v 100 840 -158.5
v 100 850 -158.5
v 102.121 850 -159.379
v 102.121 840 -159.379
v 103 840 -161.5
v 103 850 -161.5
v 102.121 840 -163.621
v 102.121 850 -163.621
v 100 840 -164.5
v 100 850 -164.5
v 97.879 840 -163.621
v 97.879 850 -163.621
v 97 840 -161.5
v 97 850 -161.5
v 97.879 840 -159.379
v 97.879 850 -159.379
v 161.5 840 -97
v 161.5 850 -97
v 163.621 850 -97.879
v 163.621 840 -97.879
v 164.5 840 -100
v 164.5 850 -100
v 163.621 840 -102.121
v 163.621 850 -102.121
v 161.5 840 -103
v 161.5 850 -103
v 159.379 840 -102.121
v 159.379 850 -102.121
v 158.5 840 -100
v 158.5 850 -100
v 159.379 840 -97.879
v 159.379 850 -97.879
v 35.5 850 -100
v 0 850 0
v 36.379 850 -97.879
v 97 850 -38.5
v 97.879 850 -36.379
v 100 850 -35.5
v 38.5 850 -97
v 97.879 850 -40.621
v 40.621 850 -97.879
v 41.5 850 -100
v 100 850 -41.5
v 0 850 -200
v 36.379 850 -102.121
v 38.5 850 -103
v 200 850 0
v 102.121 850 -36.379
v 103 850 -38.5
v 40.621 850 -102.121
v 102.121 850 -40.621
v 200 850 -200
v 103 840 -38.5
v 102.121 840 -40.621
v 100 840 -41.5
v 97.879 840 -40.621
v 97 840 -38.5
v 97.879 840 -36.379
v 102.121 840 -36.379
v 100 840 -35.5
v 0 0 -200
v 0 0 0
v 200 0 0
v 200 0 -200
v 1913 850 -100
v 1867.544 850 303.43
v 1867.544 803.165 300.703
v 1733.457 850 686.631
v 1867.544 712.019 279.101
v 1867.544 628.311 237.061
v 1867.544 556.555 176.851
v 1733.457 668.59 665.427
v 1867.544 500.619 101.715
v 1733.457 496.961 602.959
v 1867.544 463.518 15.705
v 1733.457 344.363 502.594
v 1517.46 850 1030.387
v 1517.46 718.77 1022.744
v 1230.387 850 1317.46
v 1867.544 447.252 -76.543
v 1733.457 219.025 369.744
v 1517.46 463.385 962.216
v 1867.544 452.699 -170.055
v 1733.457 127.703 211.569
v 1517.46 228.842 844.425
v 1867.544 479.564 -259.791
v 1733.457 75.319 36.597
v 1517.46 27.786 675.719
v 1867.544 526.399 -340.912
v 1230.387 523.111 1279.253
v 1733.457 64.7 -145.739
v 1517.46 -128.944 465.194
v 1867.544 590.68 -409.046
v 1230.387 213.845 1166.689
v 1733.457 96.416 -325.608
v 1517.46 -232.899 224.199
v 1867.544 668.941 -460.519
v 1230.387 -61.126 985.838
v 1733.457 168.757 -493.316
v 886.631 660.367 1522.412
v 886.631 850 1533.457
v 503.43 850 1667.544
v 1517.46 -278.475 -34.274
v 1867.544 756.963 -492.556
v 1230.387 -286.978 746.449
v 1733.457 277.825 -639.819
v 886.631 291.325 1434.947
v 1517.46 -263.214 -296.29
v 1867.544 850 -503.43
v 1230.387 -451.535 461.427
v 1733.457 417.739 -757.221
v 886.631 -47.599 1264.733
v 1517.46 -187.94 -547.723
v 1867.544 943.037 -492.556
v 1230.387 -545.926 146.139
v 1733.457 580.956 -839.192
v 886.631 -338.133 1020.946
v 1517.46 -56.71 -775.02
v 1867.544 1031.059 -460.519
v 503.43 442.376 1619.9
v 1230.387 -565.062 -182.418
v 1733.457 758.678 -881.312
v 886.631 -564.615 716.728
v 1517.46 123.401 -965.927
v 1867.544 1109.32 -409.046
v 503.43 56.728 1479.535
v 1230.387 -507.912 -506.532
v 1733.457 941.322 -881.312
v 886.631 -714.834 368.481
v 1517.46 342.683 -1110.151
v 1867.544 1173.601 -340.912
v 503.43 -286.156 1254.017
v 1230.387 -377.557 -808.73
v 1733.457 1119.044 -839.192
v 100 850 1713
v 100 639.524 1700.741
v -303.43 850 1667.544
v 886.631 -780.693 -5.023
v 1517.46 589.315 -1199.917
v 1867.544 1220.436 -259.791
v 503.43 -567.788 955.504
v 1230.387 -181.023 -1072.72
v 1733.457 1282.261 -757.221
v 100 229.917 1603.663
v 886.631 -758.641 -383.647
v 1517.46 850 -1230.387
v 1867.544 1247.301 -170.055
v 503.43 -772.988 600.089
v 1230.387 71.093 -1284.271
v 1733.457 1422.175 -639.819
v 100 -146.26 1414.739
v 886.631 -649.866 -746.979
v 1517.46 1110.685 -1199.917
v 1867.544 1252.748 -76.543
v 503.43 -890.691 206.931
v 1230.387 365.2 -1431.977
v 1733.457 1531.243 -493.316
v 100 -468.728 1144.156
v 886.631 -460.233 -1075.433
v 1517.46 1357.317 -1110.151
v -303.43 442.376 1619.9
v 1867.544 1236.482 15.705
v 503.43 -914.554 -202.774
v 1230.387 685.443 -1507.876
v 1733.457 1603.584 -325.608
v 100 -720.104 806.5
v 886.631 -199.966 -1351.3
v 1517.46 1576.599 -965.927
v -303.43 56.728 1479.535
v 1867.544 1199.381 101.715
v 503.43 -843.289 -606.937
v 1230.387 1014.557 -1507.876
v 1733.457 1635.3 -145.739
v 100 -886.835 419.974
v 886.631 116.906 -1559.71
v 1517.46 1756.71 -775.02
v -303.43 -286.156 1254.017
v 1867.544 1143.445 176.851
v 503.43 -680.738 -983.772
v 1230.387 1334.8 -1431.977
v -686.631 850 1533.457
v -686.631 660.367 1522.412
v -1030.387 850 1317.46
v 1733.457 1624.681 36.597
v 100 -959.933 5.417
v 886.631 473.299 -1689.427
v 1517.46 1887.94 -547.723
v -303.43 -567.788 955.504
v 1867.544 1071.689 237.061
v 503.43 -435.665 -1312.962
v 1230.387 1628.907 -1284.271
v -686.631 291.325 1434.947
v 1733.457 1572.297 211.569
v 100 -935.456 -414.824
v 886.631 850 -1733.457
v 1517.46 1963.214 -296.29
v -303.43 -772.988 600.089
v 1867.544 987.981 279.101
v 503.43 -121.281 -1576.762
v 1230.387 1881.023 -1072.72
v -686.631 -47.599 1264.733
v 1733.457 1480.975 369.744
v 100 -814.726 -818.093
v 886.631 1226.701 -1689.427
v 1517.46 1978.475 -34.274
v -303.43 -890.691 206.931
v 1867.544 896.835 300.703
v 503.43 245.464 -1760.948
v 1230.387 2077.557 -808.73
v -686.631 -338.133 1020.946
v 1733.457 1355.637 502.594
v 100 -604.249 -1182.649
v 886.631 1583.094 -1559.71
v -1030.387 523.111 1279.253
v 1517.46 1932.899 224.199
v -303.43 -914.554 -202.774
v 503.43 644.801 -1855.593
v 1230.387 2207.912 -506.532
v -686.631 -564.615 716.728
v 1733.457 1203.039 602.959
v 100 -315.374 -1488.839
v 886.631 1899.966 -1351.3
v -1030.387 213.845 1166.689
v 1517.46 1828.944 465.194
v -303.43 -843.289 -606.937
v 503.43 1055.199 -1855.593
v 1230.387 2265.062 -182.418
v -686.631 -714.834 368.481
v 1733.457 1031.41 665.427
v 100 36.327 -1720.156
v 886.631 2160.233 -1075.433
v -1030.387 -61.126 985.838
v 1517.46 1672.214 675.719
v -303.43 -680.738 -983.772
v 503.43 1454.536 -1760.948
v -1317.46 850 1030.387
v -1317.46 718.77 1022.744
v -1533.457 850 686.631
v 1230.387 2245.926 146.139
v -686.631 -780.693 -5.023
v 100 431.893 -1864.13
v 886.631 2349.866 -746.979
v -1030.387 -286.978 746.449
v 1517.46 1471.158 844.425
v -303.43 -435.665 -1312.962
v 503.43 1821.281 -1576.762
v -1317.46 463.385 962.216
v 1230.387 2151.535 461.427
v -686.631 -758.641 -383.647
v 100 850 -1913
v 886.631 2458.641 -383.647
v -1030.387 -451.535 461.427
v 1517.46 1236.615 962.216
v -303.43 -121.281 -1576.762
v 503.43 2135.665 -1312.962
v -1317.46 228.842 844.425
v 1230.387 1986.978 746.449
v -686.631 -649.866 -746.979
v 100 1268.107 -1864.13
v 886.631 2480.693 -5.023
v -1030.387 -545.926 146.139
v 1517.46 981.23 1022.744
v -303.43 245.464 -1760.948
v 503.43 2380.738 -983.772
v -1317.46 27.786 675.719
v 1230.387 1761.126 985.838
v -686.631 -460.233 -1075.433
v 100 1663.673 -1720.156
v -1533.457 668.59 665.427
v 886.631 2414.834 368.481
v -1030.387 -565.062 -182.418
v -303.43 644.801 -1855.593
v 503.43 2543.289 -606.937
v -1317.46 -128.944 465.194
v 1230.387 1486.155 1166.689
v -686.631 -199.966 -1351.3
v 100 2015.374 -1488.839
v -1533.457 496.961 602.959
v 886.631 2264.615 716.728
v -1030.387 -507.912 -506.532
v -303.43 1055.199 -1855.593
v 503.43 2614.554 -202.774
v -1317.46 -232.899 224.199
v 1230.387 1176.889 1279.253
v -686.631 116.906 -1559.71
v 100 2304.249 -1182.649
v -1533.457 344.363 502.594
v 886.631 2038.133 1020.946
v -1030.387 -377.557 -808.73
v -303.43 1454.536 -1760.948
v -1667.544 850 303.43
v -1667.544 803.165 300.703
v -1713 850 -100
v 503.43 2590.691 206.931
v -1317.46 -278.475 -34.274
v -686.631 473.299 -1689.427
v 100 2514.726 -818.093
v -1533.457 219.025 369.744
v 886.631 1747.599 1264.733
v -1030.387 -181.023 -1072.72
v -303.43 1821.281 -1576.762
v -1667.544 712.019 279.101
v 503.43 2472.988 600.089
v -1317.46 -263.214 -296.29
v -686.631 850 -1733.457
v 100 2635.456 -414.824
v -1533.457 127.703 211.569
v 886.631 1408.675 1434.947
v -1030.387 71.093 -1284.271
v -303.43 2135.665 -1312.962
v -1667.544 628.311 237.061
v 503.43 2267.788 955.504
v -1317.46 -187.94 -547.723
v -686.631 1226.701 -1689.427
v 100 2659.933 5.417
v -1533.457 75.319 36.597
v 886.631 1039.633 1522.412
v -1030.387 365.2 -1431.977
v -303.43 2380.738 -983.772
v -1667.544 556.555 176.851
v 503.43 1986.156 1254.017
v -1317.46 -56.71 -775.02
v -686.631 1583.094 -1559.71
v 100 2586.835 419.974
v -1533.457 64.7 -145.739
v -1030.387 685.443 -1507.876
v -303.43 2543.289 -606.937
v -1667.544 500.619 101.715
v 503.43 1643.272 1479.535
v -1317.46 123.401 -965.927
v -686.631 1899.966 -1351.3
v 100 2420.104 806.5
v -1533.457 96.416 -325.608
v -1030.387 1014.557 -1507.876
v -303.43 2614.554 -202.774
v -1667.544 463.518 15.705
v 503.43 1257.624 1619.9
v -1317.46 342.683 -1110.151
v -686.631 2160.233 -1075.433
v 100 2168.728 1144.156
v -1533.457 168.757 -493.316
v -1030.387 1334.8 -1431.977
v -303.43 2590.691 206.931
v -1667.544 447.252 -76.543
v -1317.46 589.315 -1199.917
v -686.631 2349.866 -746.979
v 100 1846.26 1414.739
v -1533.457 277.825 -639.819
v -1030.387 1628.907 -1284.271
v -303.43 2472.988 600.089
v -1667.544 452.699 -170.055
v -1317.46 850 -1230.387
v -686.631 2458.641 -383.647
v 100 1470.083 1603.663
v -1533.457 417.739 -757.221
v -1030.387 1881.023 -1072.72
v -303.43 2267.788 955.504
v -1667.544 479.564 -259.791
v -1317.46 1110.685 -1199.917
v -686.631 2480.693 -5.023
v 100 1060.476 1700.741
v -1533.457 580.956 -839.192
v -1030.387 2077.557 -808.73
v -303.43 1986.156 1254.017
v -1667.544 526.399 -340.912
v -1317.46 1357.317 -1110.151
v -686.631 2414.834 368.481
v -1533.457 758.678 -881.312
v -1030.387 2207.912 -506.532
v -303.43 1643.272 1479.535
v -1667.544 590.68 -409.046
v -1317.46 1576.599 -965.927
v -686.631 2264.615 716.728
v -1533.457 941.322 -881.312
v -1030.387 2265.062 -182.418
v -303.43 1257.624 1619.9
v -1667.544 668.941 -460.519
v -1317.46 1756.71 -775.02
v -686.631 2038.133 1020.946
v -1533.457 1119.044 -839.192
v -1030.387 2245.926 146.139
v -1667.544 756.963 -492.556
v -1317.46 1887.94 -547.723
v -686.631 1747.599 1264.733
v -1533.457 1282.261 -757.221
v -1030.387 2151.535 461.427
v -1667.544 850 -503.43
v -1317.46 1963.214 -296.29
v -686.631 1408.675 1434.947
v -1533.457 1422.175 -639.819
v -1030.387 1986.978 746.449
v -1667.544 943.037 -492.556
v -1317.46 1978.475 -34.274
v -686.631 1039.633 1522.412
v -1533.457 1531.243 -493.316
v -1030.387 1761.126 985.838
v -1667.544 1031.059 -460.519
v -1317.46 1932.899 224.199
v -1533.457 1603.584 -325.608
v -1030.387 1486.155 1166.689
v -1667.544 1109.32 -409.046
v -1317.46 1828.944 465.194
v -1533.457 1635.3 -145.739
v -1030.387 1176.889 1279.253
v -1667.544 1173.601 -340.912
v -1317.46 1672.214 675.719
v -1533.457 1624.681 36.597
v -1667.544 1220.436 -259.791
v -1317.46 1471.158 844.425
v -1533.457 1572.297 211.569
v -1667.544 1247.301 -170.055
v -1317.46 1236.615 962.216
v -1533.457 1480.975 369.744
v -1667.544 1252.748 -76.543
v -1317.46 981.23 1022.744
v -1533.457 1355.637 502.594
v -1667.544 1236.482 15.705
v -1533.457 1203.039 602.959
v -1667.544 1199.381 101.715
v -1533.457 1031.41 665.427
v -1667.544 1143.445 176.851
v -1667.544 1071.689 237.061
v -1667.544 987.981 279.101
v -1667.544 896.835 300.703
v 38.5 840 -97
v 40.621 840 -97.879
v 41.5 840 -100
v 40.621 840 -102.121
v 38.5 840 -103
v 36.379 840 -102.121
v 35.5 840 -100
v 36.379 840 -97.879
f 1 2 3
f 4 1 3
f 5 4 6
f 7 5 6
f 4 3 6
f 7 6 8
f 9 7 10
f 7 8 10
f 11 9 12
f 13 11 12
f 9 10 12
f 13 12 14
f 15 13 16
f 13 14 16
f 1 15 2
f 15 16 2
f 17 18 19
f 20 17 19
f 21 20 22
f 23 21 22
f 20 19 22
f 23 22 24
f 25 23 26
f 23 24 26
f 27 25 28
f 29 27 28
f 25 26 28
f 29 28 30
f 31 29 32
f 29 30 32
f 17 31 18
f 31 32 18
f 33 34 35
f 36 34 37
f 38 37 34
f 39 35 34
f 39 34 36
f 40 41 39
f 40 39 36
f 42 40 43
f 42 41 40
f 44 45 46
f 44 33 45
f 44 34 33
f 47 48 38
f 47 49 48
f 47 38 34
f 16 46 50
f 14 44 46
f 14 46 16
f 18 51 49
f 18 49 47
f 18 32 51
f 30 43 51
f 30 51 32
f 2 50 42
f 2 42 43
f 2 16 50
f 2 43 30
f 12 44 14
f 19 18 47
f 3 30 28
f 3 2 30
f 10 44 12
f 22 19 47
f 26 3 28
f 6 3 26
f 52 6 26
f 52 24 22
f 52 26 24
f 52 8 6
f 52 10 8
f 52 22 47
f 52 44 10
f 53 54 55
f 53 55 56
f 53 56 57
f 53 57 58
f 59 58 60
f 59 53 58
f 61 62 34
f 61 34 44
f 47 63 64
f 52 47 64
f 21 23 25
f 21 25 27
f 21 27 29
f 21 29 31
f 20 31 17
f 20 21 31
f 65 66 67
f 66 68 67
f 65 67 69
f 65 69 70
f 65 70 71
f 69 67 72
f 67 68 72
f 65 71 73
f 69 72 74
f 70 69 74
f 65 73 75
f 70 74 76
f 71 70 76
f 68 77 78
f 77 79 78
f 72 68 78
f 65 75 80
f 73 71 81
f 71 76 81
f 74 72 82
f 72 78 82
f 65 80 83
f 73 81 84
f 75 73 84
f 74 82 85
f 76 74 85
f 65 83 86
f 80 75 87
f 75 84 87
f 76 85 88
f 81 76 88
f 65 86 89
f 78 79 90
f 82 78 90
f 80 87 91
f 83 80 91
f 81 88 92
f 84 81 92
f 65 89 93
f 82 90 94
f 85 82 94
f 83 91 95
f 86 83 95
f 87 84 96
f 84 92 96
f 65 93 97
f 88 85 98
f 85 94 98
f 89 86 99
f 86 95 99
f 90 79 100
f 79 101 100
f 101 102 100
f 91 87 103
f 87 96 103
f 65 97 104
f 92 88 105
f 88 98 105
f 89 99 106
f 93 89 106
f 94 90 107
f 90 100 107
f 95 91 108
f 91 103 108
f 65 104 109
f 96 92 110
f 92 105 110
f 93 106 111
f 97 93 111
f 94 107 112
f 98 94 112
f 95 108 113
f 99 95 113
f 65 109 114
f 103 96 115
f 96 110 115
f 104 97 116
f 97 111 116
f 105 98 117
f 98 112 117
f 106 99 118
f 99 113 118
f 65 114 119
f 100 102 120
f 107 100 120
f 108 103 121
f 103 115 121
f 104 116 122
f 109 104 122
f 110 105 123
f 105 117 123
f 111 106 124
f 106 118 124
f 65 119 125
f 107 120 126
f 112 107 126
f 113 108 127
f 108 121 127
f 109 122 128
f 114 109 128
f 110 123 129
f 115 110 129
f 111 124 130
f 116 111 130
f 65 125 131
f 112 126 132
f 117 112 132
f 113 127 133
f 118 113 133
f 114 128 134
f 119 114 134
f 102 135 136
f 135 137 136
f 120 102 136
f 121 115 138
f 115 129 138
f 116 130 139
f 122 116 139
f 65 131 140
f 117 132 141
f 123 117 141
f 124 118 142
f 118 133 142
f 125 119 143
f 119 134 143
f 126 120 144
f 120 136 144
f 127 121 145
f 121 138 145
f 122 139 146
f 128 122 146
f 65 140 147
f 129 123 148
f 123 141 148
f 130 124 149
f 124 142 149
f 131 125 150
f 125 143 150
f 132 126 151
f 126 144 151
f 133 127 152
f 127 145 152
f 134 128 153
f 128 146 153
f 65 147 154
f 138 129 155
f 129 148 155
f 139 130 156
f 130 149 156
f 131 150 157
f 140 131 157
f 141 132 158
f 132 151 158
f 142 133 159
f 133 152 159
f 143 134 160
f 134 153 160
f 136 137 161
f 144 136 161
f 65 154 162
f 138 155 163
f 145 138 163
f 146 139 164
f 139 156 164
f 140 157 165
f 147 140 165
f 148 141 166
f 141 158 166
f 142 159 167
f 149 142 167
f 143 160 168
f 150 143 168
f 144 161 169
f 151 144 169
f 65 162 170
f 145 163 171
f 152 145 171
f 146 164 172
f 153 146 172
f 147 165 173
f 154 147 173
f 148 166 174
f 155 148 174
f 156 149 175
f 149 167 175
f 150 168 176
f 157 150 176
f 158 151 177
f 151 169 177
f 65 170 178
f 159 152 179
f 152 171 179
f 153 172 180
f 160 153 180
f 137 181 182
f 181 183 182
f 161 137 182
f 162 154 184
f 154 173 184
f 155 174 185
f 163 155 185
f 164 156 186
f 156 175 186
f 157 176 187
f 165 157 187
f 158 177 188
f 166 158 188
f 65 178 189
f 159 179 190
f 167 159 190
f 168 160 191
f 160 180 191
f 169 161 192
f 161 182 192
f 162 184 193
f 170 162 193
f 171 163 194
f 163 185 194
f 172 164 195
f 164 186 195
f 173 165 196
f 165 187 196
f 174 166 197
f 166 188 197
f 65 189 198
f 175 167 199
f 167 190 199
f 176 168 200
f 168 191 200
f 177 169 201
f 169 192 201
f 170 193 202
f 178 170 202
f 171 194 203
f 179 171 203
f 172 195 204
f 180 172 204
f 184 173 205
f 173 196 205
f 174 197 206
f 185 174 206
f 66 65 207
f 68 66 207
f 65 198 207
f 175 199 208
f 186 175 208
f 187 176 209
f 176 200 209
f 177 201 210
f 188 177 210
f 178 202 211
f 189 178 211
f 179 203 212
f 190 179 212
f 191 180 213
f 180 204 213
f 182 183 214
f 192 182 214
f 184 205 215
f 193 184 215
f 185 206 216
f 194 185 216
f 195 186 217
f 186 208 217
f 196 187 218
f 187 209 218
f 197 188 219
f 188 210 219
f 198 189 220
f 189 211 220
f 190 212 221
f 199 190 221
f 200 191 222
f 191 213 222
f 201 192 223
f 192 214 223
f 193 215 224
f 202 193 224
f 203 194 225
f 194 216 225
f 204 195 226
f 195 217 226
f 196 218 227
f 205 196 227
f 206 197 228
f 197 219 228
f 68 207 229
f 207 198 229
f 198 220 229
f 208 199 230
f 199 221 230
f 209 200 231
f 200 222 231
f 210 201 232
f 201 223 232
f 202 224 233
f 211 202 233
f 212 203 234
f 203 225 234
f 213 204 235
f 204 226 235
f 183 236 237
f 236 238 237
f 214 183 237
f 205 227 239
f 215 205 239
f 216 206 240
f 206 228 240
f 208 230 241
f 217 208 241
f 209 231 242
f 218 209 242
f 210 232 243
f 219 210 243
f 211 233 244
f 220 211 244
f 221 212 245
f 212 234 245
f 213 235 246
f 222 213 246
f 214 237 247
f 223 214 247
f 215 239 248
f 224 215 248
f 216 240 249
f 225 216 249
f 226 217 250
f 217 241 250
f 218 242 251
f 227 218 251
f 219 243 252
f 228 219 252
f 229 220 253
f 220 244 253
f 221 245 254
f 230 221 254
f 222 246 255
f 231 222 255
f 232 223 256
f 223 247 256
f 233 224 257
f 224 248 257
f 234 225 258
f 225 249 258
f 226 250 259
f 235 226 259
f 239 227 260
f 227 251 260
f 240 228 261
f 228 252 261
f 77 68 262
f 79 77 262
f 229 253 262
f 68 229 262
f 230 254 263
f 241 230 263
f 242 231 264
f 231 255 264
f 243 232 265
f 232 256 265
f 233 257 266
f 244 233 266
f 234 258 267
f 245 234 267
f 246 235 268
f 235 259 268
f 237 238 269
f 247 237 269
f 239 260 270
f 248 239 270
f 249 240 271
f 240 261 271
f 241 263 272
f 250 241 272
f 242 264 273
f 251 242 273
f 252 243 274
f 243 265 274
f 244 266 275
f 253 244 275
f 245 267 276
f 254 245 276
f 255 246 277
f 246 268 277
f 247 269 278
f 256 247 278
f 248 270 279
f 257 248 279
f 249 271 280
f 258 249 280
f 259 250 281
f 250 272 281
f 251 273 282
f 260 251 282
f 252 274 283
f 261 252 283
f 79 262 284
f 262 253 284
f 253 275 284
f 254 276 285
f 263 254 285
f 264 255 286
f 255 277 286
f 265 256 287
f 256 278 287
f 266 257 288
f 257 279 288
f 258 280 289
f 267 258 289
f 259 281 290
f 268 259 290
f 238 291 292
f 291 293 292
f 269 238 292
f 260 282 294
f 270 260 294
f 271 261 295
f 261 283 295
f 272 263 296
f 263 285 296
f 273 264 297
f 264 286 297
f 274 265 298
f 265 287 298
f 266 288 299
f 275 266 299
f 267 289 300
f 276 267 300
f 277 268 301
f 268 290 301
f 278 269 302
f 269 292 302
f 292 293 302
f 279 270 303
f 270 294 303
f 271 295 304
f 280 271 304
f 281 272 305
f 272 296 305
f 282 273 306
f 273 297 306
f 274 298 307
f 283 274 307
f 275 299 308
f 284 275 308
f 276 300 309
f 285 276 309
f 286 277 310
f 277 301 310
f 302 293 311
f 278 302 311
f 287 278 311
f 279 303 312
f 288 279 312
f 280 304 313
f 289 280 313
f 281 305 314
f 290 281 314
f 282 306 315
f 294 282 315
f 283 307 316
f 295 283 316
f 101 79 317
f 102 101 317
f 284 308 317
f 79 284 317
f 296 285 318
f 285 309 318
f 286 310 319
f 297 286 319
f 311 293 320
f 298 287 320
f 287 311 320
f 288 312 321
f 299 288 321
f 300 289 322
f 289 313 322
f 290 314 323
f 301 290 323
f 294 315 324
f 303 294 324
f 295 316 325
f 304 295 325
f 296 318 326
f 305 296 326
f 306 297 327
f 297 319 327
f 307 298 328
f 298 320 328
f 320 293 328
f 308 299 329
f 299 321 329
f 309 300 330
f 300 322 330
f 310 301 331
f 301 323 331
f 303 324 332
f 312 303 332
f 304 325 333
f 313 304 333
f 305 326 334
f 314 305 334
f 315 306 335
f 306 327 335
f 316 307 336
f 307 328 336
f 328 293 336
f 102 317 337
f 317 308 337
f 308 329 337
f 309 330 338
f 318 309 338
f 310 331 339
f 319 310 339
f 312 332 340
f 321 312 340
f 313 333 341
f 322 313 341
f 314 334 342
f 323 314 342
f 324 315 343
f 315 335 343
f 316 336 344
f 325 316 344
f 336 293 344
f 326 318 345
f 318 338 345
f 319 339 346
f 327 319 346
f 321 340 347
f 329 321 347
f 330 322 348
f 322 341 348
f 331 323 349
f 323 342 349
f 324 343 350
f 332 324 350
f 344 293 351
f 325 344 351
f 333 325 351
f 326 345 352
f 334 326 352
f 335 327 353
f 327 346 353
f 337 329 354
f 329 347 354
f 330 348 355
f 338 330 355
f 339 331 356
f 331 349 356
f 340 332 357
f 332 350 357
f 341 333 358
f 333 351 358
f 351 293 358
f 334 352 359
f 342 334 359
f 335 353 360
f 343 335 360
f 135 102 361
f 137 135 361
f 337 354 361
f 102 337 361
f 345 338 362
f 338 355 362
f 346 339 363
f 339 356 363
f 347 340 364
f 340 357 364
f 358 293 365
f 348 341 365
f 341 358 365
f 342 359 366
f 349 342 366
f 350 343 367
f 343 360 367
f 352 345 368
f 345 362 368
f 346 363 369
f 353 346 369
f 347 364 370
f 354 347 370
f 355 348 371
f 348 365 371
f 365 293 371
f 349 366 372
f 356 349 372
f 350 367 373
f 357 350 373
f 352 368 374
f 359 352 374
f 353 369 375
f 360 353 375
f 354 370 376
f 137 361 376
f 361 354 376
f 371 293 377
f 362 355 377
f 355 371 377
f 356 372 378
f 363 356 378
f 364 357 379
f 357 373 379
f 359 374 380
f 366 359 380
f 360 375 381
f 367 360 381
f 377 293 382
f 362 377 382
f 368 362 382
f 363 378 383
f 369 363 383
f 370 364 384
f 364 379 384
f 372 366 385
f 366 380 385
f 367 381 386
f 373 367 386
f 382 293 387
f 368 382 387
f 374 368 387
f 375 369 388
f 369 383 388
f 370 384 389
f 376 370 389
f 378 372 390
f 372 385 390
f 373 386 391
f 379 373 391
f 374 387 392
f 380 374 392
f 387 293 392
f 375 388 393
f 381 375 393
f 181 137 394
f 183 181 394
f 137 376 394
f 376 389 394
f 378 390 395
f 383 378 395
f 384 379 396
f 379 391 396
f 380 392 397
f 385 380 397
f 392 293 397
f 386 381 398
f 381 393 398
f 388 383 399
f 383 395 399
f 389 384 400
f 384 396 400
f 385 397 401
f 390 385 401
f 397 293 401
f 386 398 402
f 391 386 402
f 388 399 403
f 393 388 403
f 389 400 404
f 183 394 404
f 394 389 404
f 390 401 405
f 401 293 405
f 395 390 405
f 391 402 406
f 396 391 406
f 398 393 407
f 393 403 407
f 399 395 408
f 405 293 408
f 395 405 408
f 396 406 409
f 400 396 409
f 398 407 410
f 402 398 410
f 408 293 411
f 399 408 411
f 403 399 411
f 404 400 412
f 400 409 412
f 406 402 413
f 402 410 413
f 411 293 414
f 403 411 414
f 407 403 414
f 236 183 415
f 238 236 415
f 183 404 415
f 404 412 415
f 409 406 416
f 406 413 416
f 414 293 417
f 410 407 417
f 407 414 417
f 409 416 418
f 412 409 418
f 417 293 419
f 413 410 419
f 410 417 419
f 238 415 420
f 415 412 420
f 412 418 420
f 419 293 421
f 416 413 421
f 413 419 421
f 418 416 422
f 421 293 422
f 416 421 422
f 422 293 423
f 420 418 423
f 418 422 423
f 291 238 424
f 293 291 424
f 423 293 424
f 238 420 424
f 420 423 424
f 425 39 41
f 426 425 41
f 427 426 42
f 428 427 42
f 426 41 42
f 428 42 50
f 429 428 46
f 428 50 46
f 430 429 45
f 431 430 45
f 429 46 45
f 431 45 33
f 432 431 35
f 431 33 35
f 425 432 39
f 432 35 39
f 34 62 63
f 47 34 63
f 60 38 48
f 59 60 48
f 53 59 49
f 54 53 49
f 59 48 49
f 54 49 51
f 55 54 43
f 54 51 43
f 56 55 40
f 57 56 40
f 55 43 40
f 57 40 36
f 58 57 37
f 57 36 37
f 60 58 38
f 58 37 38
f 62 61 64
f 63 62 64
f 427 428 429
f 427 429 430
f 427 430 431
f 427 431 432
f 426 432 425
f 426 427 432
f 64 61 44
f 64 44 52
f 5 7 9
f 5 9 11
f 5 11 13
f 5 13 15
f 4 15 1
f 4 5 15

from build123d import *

# Parameters (mm, degrees)
SKETCH1_W           = 200
SKETCH1_H           = 200
BOSS_EXTRUDE1_DEPTH = 850
SKETCH2_R           = 3
CUT_EXTRUDE1_DEPTH  = 10


with BuildPart() as part:
    # Sketch1 → Boss-Extrude1 (new body)
    with BuildSketch(Plane(origin=(0, 0, 0), x_dir=(1, 0, 0), z_dir=(0, 1, 0))):
        with Locations((100, 100)):
            Rectangle(SKETCH1_W, SKETCH1_H)
    extrude(amount=BOSS_EXTRUDE1_DEPTH)

    # Sketch2 → Cut-Extrude1 (cut)
    with BuildSketch(Plane(origin=(0, 850, 0), x_dir=(1, 0, 0), z_dir=(0, 1, 0))):
        with Locations(Location((100, 161.5, 0), (0, 0, 270))):
            Circle(SKETCH2_R)
        with Locations(Location((161.5, 100, 0), (0, 0, 270))):
            Circle(SKETCH2_R)
        with Locations(Location((100, 38.5, 0), (0, 0, 270))):
            Circle(SKETCH2_R)
        with Locations(Location((38.5, 100, 0), (0, 0, 270))):
            Circle(SKETCH2_R)
    extrude(amount=-CUT_EXTRUDE1_DEPTH, mode=Mode.SUBTRACT)


with BuildPart() as body_2:
    # Sketch3 → Revolve1 (revolve)
    with BuildSketch(Plane(origin=(0, 850, 0), x_dir=(1, 0, 0), z_dir=(0, 1, 0))):
        with BuildLine():
            Line((-1713, 100), (1913, 100))
            ThreePointArc((1913, 100), (100, -1713), (-1713, 100))
        make_face()
    revolve(axis=Axis((-1713, 850, -100), (1, 0, 0)))


solid = Compound([part.part, body_2.part])
